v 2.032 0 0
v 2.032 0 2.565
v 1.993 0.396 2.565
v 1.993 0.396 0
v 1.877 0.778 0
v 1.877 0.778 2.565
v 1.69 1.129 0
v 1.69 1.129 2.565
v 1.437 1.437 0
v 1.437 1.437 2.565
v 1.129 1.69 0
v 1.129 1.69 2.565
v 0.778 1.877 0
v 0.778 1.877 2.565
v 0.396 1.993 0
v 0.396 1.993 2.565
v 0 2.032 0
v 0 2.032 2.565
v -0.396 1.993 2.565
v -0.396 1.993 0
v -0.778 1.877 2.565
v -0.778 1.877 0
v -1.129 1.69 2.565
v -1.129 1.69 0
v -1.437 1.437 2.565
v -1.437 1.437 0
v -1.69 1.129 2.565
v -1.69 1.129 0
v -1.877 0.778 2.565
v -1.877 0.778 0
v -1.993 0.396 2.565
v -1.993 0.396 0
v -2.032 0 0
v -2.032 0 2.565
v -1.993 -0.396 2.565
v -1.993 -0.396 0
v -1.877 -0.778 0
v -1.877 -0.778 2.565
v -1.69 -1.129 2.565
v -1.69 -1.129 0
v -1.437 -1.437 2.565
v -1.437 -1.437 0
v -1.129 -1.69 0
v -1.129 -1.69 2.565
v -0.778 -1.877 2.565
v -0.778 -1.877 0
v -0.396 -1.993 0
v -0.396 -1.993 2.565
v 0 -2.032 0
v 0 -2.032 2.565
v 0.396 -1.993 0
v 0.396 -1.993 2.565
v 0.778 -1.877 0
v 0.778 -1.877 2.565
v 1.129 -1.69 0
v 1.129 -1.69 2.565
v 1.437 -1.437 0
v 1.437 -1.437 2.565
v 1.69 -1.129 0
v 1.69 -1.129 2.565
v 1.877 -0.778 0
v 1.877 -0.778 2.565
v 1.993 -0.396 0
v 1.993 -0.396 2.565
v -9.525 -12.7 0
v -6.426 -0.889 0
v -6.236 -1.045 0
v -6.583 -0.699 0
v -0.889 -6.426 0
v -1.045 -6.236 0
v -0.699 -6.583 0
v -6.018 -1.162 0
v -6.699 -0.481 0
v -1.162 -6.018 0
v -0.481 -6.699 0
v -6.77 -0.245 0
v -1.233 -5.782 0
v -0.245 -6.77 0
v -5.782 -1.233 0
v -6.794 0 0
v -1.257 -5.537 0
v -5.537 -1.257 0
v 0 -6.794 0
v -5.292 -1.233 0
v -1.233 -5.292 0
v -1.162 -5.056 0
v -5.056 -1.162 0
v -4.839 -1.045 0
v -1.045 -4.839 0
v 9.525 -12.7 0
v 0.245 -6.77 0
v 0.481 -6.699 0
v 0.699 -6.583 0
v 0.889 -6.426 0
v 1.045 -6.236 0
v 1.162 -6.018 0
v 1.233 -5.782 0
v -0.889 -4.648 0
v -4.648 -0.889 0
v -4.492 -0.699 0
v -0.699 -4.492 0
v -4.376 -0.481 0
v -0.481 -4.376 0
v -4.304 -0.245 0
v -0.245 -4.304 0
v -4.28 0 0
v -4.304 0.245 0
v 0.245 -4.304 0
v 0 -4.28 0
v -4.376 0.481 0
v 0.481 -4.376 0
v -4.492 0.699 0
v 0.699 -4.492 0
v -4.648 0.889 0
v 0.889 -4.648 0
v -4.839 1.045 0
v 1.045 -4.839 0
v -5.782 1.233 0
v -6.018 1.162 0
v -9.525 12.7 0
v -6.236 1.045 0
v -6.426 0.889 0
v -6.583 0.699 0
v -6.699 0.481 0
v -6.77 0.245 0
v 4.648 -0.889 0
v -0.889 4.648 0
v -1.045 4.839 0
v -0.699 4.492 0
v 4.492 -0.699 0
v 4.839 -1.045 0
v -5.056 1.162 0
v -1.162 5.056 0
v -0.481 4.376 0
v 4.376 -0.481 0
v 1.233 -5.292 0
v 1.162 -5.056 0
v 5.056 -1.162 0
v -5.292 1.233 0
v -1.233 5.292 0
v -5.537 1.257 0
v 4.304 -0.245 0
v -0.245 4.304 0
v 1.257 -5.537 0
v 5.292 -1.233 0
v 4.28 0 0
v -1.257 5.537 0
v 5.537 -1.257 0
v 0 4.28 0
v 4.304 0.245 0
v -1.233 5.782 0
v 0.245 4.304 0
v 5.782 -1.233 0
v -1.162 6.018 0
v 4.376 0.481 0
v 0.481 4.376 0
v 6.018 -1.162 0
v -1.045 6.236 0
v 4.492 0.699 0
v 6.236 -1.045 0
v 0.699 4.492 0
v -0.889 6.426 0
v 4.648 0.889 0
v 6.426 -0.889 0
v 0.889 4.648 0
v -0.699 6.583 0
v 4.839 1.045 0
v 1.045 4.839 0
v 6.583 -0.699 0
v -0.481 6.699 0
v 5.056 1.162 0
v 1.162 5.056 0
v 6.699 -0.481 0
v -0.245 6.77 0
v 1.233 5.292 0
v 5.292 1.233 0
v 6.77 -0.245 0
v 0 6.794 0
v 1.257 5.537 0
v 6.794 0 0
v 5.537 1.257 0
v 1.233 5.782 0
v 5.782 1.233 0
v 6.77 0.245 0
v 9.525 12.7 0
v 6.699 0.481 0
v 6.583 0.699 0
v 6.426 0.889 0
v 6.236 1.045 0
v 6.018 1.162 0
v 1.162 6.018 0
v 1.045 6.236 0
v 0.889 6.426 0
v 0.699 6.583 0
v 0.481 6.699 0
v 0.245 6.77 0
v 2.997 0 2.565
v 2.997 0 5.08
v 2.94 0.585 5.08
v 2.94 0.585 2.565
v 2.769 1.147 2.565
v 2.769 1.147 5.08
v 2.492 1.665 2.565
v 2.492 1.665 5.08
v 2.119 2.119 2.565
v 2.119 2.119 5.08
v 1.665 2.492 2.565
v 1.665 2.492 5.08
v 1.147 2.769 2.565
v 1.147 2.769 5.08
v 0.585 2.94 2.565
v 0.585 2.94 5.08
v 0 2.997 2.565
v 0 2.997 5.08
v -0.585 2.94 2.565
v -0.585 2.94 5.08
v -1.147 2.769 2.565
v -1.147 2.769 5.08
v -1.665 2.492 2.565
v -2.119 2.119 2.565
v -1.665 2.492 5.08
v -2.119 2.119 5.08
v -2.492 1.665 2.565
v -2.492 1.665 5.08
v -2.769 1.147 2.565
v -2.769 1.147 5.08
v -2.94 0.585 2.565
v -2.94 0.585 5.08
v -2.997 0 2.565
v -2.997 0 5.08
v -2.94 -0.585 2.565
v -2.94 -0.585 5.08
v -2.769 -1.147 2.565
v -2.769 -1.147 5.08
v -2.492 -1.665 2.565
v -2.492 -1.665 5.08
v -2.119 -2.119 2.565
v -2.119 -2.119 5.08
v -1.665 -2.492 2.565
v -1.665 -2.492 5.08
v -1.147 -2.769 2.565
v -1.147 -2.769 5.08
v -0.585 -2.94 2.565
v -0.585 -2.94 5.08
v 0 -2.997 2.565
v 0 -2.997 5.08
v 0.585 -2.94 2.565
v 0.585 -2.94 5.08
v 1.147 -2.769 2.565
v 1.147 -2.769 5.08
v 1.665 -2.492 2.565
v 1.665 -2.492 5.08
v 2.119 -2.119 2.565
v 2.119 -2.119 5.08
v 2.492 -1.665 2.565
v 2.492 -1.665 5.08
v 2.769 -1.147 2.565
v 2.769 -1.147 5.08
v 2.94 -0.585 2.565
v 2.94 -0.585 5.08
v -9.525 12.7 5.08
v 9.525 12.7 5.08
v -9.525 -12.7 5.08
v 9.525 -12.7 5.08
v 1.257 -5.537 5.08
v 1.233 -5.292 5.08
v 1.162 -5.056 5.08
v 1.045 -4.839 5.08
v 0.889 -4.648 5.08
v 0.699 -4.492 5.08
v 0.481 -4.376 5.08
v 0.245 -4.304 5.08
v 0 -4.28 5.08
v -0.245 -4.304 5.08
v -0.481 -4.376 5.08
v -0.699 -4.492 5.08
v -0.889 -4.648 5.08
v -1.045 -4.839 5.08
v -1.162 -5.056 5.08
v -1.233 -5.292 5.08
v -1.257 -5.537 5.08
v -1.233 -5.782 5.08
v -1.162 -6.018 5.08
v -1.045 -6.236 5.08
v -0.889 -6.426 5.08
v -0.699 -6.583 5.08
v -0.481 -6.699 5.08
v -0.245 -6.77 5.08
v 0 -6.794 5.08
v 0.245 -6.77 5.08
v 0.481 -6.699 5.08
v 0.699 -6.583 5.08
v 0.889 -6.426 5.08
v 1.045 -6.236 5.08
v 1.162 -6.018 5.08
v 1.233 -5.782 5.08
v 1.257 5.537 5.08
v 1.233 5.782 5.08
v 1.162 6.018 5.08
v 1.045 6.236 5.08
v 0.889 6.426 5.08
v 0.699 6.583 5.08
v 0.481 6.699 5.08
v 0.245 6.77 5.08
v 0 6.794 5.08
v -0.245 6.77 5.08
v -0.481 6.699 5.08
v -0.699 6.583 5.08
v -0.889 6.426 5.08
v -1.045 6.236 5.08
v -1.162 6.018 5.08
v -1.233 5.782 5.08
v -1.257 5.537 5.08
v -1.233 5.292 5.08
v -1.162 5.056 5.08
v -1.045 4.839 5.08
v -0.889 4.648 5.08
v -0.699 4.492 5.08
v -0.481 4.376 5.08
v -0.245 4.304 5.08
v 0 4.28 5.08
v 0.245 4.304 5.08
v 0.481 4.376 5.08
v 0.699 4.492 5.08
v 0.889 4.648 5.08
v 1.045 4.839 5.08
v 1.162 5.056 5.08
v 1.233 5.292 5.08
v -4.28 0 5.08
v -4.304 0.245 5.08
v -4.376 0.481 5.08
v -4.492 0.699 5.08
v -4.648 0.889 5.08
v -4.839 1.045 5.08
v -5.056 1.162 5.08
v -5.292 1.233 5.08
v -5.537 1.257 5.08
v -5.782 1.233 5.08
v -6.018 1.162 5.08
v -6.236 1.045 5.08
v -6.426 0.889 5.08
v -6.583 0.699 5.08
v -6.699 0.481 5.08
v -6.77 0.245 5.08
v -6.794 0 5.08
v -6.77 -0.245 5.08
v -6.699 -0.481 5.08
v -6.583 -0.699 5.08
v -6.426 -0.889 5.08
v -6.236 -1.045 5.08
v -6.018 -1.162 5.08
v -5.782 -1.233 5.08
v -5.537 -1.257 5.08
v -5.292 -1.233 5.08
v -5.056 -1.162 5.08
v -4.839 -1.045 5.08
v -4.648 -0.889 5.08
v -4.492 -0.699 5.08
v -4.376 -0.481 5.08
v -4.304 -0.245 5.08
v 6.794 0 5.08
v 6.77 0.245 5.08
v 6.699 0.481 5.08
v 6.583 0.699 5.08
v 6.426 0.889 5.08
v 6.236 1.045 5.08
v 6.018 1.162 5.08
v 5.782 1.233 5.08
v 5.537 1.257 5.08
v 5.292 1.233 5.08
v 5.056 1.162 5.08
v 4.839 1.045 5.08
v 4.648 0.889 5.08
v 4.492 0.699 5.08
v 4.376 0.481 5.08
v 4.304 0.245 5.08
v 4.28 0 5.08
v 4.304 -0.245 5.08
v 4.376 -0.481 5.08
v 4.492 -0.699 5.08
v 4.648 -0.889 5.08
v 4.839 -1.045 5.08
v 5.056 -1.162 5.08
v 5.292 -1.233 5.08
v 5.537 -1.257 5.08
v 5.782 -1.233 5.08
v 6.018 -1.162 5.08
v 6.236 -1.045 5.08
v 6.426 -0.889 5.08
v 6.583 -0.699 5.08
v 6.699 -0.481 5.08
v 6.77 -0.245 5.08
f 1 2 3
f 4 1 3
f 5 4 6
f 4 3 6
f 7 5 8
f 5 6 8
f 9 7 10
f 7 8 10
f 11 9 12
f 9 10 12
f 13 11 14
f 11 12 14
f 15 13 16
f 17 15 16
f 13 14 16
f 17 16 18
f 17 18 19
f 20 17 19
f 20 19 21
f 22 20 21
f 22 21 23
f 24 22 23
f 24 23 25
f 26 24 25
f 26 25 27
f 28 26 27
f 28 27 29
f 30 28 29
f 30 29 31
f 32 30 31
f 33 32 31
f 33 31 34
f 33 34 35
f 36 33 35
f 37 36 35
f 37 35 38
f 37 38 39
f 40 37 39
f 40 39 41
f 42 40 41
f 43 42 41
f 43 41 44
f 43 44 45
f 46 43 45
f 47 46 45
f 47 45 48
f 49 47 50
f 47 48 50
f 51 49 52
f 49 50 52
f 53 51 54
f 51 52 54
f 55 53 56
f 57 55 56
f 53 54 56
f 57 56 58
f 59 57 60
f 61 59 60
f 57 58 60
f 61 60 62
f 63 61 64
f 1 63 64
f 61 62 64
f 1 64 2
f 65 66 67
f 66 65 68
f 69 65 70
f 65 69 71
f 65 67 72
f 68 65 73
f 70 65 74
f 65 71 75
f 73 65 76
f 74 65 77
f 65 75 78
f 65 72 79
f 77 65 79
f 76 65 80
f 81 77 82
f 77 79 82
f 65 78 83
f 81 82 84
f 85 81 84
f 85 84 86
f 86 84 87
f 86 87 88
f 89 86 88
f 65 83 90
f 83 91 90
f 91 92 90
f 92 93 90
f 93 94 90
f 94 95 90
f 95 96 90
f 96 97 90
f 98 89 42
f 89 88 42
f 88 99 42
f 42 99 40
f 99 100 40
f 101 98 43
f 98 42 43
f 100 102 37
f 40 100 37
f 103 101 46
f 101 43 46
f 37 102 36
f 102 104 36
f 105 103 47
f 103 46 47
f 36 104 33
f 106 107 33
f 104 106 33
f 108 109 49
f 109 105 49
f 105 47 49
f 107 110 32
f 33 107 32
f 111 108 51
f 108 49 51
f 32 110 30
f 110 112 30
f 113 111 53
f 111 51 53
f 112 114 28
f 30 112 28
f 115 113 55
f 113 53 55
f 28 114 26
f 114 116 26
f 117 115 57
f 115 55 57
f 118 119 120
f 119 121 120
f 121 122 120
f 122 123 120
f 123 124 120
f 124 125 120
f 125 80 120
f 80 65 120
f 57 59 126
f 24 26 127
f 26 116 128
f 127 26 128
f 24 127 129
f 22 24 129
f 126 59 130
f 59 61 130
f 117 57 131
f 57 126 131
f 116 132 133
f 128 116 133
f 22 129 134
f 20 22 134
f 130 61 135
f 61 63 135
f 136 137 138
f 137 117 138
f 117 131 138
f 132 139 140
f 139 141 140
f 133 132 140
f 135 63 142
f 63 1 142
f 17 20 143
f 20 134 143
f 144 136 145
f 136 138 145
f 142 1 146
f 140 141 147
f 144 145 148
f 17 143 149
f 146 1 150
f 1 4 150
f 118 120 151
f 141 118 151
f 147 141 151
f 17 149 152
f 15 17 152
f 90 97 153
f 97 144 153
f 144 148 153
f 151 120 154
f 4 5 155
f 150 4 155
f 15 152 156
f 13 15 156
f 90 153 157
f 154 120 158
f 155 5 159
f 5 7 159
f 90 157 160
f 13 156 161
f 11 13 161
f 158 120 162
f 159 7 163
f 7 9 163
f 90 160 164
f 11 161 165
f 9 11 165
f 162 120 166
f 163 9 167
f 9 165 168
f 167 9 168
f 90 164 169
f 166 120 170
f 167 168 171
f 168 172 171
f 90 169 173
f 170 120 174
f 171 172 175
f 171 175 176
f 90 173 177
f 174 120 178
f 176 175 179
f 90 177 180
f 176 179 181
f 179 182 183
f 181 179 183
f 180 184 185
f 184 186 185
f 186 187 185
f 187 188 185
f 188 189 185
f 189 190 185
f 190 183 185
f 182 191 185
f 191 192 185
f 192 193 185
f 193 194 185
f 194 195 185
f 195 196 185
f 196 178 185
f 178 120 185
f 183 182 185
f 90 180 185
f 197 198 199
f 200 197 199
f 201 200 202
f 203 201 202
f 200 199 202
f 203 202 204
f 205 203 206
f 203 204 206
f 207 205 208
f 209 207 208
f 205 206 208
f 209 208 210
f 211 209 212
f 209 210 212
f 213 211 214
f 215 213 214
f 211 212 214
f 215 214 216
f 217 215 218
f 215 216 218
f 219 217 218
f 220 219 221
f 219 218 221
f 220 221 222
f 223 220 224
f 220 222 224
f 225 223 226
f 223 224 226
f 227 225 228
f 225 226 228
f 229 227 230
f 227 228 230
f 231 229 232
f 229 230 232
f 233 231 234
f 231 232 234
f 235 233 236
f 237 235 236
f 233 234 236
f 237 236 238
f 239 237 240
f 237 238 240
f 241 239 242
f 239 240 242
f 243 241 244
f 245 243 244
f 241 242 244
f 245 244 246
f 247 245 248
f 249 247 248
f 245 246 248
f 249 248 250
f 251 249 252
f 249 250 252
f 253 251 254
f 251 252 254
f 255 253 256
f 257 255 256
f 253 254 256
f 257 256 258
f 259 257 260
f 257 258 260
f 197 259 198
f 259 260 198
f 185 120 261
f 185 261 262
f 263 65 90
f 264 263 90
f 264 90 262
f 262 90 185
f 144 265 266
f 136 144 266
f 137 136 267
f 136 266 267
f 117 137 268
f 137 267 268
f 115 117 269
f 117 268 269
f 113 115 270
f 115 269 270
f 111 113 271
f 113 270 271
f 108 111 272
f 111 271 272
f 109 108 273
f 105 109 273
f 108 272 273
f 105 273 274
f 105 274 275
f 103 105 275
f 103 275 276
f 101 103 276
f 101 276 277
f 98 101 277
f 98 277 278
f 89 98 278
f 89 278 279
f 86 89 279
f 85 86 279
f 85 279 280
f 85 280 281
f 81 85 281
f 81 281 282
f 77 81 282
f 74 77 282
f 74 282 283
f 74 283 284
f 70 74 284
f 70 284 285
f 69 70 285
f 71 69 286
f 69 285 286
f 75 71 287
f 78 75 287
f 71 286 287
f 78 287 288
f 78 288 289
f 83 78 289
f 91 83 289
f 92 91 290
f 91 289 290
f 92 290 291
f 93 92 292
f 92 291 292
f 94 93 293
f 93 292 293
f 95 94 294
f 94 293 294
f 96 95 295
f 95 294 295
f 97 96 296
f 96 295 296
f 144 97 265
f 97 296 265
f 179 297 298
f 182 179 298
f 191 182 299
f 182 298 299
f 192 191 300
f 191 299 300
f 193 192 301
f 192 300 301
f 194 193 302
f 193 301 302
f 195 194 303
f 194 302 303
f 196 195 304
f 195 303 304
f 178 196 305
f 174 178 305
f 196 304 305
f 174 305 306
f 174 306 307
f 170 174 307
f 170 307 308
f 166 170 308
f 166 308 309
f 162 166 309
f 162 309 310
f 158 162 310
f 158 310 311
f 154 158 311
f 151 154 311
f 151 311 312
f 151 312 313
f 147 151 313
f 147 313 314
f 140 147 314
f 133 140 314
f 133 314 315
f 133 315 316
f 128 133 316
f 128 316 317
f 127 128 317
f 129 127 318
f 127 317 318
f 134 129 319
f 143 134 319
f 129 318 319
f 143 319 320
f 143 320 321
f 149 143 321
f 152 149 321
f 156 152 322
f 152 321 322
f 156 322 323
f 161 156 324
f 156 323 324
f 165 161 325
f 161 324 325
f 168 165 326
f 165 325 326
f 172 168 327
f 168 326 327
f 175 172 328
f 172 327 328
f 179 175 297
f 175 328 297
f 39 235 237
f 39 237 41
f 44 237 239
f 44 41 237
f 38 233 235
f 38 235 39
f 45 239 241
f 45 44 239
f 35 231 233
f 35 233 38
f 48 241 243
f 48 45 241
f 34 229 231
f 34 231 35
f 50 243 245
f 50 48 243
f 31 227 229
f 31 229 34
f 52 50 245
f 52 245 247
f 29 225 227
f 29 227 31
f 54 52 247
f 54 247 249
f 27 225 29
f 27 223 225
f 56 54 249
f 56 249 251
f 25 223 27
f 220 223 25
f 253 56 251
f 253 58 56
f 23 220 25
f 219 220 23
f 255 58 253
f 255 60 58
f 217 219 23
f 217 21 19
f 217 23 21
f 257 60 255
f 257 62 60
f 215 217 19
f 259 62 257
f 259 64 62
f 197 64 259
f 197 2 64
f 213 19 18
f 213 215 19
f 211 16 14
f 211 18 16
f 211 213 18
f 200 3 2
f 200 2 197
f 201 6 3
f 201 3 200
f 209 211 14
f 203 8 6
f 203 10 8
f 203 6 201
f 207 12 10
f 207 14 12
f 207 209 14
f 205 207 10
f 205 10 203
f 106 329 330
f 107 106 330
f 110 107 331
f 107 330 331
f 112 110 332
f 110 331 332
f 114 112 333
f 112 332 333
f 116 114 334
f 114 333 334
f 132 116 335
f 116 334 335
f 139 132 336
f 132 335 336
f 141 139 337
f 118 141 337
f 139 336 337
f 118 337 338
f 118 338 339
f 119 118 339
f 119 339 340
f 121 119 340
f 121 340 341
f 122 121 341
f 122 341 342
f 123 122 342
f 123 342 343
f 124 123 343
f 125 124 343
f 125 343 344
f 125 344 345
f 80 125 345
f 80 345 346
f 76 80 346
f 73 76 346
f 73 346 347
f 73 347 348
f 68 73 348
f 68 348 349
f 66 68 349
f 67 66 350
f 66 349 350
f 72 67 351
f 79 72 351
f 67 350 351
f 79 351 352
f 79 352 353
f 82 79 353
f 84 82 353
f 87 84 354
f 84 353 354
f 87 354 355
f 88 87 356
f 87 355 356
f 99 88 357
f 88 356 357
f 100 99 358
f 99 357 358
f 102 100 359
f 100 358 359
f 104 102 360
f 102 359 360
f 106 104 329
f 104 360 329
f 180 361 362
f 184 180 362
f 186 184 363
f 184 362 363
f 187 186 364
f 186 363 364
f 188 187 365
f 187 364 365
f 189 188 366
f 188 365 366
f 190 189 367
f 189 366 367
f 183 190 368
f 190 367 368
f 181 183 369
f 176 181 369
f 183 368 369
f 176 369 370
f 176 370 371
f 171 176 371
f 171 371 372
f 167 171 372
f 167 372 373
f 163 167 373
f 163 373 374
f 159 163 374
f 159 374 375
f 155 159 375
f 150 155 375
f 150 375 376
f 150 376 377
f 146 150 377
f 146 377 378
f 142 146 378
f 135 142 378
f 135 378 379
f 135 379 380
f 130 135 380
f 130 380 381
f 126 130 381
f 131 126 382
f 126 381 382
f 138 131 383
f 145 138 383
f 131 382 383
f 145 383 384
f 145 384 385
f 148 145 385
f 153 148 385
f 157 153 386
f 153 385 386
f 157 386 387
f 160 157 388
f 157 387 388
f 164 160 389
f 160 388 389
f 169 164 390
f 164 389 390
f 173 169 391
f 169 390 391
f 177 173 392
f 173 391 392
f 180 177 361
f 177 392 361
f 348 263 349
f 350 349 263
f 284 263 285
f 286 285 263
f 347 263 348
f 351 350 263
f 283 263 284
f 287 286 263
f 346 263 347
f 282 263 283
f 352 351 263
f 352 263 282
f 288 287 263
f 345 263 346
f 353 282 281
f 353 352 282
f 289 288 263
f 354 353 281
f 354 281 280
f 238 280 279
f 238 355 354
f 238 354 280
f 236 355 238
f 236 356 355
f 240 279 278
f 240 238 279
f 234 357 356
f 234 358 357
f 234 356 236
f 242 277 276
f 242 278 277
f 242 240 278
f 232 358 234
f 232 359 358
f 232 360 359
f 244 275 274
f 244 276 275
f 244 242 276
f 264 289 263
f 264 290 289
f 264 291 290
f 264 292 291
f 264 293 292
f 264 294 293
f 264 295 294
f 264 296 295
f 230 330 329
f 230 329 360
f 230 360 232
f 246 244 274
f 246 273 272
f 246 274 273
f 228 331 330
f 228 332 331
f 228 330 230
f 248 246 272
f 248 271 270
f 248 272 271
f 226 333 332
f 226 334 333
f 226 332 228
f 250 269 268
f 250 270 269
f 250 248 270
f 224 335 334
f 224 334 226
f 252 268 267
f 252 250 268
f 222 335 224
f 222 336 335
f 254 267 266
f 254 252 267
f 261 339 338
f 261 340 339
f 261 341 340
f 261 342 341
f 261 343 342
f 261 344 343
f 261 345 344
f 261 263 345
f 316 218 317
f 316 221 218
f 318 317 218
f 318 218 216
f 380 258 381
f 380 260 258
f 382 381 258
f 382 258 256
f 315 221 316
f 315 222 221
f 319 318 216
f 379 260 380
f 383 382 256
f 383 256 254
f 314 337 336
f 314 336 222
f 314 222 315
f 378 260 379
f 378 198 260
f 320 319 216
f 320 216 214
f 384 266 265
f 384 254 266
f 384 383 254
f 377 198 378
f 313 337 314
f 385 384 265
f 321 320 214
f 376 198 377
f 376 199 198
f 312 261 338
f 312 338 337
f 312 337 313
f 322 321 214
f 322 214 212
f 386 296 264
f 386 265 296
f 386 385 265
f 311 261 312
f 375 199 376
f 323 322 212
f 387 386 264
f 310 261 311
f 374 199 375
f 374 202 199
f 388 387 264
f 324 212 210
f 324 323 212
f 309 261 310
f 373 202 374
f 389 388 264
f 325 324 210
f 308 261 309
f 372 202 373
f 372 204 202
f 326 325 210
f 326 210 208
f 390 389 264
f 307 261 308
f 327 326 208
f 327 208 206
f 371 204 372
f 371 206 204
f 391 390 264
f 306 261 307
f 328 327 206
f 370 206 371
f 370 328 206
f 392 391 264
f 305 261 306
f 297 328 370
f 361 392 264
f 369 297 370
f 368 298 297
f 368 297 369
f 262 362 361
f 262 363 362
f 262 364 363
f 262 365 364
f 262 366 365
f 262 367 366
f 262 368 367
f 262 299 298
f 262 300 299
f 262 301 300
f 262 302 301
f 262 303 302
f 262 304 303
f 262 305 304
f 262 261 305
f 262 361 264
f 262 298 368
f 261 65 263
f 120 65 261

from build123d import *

# Parameters (mm, degrees)
SKETCH1_W           = 19.05
SKETCH1_H           = 25.4
BOSS_EXTRUDE1_DEPTH = 5.08
SKETCH2_R           = 2.9972
CUT_EXTRUDE1_DEPTH  = 2.5146
SKETCH3_R           = 2.032
CUT_EXTRUDE2_DEPTH  = 3.5654
SKETCH4_R           = 1.2573
CUT_EXTRUDE4_DEPTH  = 6.08


with BuildPart() as part:
    # Sketch1 → Boss-Extrude1 (new body)
    with BuildSketch(Plane.XY):
        Rectangle(SKETCH1_W, SKETCH1_H)
    extrude(amount=BOSS_EXTRUDE1_DEPTH)

    # Sketch2 → Cut-Extrude1 (cut)
    with BuildSketch(Plane.XY.offset(5.08)):
        Circle(SKETCH2_R)
    extrude(amount=-CUT_EXTRUDE1_DEPTH, mode=Mode.SUBTRACT)

    # Sketch3 → Cut-Extrude2 (cut, through all)
    with BuildSketch(Plane.XY.offset(2.5654)):
        Circle(SKETCH3_R)
    extrude(amount=-CUT_EXTRUDE2_DEPTH, mode=Mode.SUBTRACT)

    # Sketch4 → Cut-Extrude4 (cut, through all)
    with BuildSketch(Plane.XY.offset(5.08)):
        with Locations((0, 5.5372)):
            Circle(SKETCH4_R)
        with Locations((5.5372, 0)):
            Circle(SKETCH4_R)
        with Locations((0, -5.5372)):
            Circle(SKETCH4_R)
        with Locations((-5.5372, 0)):
            Circle(SKETCH4_R)
    extrude(amount=-CUT_EXTRUDE4_DEPTH, mode=Mode.SUBTRACT)


solid = part.part
